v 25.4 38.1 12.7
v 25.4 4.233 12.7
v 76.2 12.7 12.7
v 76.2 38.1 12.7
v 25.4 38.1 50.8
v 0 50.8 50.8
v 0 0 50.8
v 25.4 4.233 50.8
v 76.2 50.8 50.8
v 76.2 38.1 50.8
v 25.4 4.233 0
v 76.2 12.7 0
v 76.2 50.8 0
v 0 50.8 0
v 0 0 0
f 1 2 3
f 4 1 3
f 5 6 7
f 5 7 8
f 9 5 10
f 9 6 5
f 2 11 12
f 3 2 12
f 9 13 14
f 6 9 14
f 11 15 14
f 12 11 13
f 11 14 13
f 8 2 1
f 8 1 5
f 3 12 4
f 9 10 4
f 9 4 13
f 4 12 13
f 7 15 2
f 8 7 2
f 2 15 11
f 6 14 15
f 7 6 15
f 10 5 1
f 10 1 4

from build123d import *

# Parameters (mm, degrees)
F2_DEPTH = 50.8
F0_W     = 50.8
F0_H     = 38.1
F3_DEPTH = 38.1


with BuildPart() as f2:
    # F1 (on Top) → F2 (new body)
    with BuildSketch(Plane.XY):
        Polygon((0, 50.8), (0, 0), (25.4, 4.233333), (25.4, 38.1), (76.2, 38.1), (76.2, 50.8), align=None)
        Polygon((25.4, 38.1), (25.4, 4.233333), (76.2, 12.7), (76.2, 38.1), align=None)
    extrude(amount=F2_DEPTH)

    # F0 (on Front) → F3 (cut)
    with BuildSketch(Plane.XZ):
        with Locations((50.8, 31.75)):
            Rectangle(F0_W, F0_H)
    extrude(amount=-F3_DEPTH, mode=Mode.SUBTRACT)


solid = f2.part
